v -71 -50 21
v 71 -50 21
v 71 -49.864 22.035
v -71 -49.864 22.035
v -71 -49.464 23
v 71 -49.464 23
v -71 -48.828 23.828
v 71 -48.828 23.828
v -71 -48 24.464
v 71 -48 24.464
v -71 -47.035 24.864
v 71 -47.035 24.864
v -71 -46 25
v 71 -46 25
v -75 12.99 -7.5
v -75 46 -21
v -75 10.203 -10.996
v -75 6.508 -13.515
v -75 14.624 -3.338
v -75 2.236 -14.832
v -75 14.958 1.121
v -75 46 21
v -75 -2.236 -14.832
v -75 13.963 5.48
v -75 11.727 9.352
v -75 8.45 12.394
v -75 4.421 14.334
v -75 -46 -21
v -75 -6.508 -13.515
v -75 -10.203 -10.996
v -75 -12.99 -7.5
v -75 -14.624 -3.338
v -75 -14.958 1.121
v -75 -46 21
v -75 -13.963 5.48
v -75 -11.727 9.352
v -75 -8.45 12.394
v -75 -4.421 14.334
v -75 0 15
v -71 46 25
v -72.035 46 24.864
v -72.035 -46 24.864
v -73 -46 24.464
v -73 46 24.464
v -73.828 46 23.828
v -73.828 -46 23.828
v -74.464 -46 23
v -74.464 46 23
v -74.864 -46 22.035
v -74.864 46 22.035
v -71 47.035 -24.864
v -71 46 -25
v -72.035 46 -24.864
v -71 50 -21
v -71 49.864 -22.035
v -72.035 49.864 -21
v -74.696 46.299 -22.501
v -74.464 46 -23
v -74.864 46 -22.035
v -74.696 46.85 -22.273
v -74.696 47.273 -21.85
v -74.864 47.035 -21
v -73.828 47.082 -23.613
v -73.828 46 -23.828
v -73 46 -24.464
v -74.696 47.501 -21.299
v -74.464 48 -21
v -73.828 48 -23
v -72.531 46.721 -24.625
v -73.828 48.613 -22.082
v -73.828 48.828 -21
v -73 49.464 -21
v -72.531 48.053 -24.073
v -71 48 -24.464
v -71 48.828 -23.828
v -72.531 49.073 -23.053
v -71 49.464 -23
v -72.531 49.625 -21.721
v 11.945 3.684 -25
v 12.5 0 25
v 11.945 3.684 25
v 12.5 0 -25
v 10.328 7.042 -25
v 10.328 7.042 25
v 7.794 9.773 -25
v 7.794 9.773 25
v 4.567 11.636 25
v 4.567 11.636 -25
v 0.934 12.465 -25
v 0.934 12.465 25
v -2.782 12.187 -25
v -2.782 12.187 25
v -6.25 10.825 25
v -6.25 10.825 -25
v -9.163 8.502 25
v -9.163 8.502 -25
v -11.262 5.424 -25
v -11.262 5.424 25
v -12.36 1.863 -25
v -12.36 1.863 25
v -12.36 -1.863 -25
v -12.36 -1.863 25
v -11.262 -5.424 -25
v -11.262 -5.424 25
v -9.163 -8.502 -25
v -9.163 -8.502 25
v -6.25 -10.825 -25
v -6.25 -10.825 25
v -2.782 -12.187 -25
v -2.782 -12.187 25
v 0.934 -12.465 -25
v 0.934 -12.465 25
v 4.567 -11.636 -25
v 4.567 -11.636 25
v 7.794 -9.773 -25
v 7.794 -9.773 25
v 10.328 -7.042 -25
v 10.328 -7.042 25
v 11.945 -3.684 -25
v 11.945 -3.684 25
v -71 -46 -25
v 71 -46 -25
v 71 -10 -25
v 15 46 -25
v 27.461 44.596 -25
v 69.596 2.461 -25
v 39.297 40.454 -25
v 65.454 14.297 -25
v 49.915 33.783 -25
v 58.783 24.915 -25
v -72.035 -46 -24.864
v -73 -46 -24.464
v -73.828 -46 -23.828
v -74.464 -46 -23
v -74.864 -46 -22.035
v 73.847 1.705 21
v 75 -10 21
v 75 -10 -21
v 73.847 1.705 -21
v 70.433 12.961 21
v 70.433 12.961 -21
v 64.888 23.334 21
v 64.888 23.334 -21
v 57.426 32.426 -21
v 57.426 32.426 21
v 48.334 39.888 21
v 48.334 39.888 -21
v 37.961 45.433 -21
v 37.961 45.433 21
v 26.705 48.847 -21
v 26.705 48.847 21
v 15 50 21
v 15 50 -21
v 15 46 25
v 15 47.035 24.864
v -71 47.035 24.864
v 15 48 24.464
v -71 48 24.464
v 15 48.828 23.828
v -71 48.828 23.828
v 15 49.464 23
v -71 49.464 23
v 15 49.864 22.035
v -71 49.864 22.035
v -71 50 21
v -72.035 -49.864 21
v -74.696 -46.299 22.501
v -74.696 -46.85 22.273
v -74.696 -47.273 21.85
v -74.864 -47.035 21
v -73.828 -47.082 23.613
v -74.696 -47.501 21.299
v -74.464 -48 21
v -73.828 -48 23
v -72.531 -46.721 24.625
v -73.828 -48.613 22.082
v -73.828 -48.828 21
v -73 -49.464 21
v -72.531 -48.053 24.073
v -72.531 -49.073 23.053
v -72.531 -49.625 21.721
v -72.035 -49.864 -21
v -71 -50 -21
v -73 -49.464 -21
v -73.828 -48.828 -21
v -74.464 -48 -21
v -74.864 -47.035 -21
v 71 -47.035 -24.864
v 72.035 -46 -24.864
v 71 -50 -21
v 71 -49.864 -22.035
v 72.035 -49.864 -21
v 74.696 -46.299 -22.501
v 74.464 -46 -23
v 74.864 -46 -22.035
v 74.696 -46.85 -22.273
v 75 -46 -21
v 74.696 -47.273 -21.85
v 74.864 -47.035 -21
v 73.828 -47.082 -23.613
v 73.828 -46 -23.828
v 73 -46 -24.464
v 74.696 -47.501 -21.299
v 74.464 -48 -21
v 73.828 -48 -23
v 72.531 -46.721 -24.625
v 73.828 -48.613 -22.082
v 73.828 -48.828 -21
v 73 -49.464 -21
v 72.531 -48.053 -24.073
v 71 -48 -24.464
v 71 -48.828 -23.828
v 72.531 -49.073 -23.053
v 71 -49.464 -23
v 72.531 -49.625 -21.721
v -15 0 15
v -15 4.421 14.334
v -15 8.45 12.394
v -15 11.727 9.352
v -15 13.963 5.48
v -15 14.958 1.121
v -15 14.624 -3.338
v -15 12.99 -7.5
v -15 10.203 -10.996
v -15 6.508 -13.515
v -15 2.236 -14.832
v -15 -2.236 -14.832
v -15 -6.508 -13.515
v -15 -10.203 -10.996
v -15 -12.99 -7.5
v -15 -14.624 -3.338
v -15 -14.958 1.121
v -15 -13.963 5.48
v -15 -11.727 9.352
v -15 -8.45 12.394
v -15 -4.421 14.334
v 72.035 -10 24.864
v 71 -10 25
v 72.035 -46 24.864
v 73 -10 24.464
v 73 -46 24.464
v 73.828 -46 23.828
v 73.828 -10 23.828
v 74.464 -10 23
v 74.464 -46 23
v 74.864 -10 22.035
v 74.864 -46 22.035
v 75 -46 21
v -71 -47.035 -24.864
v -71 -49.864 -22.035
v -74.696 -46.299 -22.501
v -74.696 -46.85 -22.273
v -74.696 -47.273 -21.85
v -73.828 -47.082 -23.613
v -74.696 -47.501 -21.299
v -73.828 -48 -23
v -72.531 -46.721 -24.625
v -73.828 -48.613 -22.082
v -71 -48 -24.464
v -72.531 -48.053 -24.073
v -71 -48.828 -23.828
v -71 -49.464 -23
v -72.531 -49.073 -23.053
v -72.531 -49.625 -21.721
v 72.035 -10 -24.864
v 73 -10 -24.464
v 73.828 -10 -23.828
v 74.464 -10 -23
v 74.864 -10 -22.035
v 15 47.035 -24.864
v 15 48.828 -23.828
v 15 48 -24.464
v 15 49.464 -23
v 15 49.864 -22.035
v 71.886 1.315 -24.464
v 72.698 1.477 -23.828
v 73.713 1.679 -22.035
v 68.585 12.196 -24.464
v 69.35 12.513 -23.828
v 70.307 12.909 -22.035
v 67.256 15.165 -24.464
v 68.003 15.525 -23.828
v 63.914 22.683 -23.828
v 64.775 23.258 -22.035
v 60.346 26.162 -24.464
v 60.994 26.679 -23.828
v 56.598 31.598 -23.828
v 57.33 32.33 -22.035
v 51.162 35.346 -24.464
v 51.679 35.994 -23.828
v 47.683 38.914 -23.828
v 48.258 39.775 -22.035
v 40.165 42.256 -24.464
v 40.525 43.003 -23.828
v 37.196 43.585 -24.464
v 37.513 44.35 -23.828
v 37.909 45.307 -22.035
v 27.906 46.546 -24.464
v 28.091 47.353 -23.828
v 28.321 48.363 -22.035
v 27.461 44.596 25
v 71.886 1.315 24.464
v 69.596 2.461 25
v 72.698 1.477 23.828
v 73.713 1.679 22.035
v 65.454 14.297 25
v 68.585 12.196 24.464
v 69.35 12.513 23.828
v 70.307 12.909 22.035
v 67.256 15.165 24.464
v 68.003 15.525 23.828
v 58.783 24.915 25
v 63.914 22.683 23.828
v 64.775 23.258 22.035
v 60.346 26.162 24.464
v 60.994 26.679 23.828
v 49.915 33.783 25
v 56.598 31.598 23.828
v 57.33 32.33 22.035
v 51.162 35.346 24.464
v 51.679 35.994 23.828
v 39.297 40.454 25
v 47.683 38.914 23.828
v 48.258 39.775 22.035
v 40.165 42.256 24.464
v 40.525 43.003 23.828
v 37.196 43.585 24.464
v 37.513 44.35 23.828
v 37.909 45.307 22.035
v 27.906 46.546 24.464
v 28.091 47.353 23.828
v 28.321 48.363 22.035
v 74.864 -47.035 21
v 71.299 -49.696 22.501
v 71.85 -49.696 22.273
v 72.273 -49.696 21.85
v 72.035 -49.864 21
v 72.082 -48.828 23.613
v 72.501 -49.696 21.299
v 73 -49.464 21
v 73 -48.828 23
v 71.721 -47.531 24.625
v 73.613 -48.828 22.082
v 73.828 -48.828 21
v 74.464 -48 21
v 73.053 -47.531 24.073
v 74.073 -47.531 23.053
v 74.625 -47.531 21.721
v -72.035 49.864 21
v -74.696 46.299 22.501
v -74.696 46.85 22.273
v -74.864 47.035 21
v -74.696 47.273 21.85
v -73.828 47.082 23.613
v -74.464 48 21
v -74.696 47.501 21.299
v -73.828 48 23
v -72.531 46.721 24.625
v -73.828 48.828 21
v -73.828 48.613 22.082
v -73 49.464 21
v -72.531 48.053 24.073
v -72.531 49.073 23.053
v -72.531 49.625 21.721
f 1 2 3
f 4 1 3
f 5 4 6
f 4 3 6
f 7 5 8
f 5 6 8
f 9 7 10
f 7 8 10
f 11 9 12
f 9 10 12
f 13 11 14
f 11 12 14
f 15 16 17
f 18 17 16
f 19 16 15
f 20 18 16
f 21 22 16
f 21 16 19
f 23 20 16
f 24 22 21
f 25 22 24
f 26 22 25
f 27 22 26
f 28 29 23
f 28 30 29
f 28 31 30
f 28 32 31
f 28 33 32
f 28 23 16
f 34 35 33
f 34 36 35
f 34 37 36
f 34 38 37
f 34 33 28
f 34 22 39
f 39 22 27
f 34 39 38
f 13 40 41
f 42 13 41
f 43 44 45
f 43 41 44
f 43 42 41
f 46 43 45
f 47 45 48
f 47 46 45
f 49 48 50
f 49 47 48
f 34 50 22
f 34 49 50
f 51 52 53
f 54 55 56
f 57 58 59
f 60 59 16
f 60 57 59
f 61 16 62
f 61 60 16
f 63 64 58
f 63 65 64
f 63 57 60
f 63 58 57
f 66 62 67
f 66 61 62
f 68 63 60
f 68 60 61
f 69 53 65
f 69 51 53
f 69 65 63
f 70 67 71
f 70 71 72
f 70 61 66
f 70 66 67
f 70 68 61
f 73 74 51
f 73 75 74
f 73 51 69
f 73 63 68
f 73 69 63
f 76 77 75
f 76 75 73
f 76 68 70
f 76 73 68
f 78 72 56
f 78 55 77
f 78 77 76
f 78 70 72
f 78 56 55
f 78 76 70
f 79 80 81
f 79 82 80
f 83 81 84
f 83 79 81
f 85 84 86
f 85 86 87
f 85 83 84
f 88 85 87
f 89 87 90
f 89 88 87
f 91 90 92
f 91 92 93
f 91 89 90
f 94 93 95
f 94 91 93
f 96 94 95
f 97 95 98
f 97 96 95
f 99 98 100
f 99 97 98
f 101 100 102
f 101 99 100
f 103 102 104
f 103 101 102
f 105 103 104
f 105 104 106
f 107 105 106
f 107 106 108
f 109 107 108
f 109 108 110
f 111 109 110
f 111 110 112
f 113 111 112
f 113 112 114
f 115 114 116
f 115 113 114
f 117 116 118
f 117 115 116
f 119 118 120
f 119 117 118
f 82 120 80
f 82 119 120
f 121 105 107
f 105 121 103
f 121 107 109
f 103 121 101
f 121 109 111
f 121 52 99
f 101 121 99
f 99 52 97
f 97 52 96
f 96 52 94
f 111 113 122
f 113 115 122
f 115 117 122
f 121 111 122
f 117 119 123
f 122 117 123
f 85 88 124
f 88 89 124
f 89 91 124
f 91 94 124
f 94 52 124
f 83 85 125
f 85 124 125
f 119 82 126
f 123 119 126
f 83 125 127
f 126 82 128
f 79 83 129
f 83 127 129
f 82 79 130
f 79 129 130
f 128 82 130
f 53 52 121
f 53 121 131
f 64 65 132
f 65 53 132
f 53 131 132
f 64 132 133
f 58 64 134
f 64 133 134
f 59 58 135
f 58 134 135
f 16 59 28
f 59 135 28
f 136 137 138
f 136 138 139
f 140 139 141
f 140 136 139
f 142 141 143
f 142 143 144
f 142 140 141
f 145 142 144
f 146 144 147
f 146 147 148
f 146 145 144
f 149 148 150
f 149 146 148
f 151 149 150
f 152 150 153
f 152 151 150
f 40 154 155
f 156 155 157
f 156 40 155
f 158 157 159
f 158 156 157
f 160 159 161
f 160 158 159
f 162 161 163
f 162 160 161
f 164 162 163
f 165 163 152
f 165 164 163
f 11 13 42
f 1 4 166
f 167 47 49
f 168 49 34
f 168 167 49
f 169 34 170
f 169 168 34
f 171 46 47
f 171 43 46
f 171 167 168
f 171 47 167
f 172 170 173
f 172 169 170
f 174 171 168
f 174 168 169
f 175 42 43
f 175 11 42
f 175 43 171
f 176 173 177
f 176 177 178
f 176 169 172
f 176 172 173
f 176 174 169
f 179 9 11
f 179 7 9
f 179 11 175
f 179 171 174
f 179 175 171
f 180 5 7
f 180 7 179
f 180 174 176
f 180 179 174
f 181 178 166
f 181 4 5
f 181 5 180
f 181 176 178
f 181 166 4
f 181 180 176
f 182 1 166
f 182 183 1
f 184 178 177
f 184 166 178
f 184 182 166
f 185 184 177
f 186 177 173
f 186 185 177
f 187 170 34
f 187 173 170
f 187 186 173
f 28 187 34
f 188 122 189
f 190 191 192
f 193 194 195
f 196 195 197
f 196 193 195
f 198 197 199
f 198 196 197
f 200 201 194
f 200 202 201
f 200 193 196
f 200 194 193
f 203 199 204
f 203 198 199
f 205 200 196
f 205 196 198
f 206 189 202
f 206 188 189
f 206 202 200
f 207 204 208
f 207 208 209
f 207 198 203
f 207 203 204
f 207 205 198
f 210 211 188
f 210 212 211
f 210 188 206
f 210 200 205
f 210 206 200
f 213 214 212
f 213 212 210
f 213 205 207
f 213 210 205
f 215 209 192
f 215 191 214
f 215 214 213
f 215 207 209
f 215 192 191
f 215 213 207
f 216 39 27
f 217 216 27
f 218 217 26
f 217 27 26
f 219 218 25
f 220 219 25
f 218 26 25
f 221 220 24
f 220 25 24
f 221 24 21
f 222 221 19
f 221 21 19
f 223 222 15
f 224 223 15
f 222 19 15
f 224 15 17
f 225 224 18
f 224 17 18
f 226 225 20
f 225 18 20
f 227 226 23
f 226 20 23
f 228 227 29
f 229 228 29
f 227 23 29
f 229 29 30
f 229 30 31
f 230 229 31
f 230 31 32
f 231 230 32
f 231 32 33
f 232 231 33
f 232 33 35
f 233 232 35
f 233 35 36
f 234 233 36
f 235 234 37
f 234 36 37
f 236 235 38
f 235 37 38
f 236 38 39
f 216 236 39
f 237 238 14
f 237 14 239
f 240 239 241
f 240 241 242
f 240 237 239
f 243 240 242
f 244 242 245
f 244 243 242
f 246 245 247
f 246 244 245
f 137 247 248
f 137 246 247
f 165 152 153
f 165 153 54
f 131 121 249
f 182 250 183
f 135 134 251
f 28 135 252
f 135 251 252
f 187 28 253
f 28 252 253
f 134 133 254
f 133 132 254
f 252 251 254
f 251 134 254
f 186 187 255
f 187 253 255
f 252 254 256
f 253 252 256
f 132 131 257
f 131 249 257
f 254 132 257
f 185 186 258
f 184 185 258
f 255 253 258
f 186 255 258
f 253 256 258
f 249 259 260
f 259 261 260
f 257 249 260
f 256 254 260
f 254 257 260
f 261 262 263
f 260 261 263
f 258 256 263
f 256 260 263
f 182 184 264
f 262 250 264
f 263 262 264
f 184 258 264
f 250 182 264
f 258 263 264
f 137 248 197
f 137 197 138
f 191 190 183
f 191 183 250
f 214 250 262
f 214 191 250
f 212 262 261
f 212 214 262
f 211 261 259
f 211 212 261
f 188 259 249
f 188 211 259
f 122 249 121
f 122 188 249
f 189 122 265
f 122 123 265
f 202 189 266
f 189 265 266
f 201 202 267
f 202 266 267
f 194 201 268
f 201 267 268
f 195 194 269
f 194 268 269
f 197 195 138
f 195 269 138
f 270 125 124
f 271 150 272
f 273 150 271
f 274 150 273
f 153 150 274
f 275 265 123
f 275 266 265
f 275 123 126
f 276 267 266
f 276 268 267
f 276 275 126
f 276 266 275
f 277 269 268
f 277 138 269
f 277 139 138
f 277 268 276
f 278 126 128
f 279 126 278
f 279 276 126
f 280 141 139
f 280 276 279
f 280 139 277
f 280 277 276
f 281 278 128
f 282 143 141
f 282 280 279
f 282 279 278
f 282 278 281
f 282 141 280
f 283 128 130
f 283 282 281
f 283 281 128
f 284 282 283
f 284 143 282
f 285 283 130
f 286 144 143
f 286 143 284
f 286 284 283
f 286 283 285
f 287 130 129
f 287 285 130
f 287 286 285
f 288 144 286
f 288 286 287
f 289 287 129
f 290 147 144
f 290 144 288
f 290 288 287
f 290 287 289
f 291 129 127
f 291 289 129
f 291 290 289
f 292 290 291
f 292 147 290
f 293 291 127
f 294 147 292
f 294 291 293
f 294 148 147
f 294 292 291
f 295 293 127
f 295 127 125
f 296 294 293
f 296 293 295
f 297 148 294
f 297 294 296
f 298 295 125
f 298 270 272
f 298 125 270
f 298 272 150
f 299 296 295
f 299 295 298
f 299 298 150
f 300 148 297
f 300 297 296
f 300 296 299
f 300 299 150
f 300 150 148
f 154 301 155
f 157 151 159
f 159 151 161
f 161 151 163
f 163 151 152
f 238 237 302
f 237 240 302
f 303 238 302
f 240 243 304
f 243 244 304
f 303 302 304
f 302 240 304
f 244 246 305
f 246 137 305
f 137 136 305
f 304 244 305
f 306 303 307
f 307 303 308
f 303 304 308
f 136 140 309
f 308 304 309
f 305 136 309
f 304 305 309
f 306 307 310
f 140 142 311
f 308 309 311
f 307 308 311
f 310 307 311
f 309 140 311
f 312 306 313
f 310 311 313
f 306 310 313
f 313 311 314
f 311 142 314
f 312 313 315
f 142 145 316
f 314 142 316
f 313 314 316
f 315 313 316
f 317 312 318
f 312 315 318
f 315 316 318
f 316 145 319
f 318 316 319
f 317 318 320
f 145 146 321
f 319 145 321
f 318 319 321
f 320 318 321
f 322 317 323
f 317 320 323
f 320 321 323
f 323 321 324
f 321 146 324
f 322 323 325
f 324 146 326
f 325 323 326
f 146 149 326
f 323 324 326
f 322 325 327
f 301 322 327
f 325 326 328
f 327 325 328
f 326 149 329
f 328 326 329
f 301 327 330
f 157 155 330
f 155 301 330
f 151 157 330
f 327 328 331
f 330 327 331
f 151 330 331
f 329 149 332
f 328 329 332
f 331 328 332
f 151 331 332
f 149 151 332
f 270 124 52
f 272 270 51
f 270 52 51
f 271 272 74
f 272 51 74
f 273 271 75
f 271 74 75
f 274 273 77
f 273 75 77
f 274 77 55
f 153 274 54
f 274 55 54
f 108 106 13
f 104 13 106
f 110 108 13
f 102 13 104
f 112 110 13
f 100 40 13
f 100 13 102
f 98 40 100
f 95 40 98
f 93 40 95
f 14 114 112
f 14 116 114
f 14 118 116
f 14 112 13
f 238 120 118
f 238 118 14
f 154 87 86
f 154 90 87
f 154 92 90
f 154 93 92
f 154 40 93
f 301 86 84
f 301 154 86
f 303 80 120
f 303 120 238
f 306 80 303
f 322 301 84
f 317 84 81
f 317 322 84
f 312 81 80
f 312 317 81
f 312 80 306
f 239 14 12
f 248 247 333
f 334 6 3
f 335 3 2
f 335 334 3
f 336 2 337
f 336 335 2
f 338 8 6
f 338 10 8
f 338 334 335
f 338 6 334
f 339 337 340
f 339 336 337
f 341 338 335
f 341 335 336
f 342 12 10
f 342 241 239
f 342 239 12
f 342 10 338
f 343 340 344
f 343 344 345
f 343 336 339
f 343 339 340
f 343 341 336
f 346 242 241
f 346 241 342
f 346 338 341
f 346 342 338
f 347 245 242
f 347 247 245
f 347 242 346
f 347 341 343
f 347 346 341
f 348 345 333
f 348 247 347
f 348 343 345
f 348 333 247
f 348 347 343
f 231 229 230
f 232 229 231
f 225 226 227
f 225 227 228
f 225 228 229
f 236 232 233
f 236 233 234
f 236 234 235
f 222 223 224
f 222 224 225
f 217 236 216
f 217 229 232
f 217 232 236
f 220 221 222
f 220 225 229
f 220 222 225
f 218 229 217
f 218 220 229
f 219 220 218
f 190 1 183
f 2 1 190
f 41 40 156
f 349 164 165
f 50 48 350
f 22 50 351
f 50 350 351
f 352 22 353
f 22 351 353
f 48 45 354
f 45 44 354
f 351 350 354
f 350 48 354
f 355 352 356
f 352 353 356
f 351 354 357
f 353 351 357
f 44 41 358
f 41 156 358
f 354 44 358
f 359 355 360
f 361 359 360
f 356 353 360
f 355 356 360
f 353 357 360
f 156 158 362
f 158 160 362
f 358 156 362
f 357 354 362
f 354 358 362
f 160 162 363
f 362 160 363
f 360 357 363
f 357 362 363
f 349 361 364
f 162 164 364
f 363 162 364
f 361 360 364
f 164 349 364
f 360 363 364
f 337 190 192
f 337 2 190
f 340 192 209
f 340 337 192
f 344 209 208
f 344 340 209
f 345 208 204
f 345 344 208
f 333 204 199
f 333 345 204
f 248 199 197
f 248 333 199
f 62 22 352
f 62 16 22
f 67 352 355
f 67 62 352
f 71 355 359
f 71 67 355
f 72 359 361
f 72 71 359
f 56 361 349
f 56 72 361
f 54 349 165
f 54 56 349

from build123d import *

# Parameters (mm, degrees)
SKETCH1_R           = 12.5
BOSS_EXTRUDE1_DEPTH = 25
SKETCH2_R           = 15
CUT_EXTRUDE1_DEPTH  = 60
FILLET1_R           = 4


with BuildPart() as part:
    # Sketch1 → Boss-Extrude1 (new, symmetric)
    with BuildSketch(Plane.XY):
        with BuildLine():
            Line((-75, -50), (75, -50))
            Line((75, -50), (75, -10))
            ThreePointArc((75, -10), (57.426406871, 32.426406871), (15, 50))
            Line((15, 50), (-75, 50))
            Line((-75, 50), (-75, -50))
        make_face()
        Circle(SKETCH1_R, mode=Mode.SUBTRACT)
    extrude(amount=BOSS_EXTRUDE1_DEPTH, both=True)

    # Sketch2 → Cut-Extrude1 (cut)
    with BuildSketch(Plane.ZY.offset(75)):
        Circle(SKETCH2_R)
    extrude(amount=-CUT_EXTRUDE1_DEPTH, mode=Mode.SUBTRACT)

    # Fillet1
    fillet1_edges = [part.edges().sort_by_distance(p)[0] for p in [
        (0, -50, -25),
        (75, -30, -25),
        (57.426406871, 32.426406871, -25),
        (-30, 50, -25),
        (57.426406871, 32.426406871, 25),
        (75, -30, 25),
        (0, -50, 25),
        (-75, 0, 25),
        (-30, 50, 25),
        (-75, 0, -25),
        (75, -50, 0),
        (-75, -50, 0),
        (-75, 50, 0),
    ]]
    fillet(fillet1_edges, radius=FILLET1_R)


solid = part.part
